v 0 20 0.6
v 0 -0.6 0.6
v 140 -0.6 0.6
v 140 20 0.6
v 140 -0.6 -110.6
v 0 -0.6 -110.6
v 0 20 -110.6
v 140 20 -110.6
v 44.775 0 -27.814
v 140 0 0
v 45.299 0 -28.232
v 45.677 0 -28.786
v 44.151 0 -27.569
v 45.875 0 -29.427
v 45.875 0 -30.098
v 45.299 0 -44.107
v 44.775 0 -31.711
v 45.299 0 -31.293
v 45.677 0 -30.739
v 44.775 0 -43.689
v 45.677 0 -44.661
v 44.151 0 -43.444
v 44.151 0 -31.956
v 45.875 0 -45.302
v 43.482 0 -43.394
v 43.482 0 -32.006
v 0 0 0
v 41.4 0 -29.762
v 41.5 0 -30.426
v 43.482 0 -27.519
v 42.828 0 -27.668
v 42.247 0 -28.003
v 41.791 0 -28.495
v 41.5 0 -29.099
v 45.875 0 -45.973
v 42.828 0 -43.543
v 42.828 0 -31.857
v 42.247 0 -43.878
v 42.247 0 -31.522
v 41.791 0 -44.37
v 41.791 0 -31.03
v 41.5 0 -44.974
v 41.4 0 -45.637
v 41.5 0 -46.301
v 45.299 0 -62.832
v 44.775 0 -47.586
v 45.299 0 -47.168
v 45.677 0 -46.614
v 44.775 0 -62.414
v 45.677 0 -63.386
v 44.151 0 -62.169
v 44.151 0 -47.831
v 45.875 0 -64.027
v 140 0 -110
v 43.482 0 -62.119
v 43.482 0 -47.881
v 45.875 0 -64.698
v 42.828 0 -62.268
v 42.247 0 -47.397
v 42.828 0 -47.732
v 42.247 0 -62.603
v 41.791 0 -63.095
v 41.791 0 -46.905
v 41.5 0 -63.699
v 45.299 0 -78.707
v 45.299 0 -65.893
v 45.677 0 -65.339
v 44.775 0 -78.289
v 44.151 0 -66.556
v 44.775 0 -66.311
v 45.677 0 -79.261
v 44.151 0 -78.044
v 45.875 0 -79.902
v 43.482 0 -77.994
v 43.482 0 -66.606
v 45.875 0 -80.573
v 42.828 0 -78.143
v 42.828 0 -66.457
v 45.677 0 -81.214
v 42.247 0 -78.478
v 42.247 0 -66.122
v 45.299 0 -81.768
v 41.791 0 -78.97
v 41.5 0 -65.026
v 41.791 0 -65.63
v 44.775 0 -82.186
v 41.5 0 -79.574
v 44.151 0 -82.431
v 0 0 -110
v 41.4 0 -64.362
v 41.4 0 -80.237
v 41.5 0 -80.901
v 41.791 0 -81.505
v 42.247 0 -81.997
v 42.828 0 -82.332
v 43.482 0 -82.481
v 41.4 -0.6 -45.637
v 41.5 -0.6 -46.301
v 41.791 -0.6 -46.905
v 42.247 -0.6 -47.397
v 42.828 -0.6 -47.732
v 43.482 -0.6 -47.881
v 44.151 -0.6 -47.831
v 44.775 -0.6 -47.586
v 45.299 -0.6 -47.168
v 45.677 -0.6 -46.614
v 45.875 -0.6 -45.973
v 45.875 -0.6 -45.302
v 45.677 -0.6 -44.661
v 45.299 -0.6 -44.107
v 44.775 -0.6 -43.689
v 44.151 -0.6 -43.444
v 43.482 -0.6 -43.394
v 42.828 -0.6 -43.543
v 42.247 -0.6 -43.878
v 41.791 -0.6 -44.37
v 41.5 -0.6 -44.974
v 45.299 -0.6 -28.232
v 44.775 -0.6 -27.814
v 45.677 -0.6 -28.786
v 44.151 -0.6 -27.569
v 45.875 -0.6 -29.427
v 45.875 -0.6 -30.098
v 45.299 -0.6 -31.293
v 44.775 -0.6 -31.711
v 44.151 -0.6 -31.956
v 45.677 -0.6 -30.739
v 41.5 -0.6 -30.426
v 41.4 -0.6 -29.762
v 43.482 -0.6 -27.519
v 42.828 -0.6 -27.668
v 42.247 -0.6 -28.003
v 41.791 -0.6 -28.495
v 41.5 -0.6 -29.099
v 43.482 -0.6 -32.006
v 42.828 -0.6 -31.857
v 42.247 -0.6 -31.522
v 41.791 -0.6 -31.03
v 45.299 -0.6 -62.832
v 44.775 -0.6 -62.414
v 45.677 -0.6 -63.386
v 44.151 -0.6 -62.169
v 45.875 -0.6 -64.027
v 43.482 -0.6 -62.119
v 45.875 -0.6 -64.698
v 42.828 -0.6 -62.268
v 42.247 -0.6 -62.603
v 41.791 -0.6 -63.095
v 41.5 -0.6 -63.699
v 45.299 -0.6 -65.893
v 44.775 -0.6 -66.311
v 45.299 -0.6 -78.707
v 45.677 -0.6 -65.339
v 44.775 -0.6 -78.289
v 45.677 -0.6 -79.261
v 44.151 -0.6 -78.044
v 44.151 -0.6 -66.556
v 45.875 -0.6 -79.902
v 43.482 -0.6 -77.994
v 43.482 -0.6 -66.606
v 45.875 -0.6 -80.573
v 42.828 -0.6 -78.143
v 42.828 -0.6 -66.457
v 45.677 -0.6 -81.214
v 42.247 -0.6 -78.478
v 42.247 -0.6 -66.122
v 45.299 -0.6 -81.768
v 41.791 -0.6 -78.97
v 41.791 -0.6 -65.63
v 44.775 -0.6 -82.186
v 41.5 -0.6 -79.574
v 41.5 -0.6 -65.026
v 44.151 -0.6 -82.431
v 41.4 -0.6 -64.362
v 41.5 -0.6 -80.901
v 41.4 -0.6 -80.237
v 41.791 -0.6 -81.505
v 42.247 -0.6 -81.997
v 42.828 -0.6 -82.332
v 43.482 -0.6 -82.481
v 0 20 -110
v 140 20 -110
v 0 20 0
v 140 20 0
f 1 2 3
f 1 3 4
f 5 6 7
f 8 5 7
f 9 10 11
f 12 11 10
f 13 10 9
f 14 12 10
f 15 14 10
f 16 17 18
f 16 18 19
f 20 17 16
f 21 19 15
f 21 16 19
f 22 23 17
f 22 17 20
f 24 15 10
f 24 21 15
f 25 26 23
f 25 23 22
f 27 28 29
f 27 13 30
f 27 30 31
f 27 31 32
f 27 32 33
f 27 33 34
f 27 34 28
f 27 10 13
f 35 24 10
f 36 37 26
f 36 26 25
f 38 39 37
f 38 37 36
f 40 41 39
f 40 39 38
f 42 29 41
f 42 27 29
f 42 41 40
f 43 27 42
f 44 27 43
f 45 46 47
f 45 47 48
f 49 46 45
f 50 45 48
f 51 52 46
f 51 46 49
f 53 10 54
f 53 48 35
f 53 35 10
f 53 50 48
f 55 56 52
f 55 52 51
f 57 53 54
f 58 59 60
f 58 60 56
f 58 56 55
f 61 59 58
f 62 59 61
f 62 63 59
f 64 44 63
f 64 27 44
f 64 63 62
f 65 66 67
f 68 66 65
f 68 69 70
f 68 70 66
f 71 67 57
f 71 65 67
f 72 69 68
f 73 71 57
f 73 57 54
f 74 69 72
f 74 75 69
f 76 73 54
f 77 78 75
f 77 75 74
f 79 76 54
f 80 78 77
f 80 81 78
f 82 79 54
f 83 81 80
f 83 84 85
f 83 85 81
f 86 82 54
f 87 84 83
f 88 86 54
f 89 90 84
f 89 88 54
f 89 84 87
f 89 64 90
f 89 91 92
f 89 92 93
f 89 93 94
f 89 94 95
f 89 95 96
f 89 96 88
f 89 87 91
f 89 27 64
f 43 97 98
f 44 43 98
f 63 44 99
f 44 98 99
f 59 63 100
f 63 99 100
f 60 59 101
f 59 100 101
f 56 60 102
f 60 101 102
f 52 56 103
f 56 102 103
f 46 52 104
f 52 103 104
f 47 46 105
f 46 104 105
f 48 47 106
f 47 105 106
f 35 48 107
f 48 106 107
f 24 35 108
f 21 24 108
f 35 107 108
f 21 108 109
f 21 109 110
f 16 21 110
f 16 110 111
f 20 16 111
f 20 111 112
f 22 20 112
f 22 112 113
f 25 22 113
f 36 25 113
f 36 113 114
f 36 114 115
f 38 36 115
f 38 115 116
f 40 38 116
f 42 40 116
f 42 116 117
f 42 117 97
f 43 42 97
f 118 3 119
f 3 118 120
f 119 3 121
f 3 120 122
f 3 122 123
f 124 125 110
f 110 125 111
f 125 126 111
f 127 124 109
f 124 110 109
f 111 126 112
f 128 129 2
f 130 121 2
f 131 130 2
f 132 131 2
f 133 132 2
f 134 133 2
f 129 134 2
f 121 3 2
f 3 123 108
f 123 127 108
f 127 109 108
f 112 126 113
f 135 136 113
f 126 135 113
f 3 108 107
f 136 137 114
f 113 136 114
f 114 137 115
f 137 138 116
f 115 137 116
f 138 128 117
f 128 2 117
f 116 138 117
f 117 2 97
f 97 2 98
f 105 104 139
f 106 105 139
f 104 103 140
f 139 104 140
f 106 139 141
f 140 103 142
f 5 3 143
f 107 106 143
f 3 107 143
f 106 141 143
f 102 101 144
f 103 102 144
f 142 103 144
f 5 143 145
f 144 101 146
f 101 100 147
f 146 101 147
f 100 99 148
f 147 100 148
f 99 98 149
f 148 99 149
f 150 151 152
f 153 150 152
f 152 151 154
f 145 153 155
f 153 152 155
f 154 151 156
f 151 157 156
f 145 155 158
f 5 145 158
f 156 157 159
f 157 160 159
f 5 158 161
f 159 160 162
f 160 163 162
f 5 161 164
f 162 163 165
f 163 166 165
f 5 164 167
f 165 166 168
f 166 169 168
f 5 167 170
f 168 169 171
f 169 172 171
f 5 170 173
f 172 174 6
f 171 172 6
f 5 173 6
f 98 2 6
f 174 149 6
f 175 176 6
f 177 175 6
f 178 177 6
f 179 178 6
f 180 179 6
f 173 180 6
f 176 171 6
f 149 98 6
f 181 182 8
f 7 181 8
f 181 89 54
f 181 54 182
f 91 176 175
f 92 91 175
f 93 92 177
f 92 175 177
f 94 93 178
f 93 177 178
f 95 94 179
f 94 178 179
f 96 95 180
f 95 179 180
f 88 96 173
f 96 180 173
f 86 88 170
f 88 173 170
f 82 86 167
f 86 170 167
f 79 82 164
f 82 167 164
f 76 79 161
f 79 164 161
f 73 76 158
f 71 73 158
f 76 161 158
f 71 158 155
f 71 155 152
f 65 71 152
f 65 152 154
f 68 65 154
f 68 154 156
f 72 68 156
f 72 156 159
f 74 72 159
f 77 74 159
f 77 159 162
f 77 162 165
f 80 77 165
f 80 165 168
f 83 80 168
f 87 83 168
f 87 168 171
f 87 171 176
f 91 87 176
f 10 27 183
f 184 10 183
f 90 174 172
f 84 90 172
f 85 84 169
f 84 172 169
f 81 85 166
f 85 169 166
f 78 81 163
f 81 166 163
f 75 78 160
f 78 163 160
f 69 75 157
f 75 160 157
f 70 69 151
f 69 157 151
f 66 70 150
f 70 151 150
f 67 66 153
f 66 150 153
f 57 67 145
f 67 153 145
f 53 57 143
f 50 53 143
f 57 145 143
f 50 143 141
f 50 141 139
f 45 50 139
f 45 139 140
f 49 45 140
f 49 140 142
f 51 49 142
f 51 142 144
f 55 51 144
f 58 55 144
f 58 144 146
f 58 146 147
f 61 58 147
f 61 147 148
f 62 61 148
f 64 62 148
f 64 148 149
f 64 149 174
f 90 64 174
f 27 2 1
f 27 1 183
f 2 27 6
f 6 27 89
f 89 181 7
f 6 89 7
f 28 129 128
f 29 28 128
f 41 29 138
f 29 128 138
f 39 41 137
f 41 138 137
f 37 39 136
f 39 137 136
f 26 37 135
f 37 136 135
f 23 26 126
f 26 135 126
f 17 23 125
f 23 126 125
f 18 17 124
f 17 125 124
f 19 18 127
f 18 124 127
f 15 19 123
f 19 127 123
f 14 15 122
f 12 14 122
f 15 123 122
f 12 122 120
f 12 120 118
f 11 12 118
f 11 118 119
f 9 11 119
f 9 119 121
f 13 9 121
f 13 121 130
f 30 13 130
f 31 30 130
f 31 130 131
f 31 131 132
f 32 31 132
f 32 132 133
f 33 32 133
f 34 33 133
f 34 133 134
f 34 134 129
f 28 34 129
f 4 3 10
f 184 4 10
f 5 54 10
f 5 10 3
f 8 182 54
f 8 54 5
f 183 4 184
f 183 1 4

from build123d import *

# Parameters (mm, degrees)
CROQUIS1_W                   = 110
CROQUIS1_H                   = 20
SALIENTE_EXTRUIR1_DEPTH      = 140
VACIADO1_T                   = 0.6
TALADRO_DE_MARGEN_PARA_M42_D = 4.5


with BuildPart() as part:
    # Croquis1 → Saliente-Extruir1 (new body)
    with BuildSketch(Plane(origin=(0, 0, 0), x_dir=(0, 0, -1), z_dir=(1, 0, 0))):
        with Locations((55, 10)):
            Rectangle(CROQUIS1_W, CROQUIS1_H)
    extrude(amount=SALIENTE_EXTRUIR1_DEPTH)

    # Vaciado1
    vaciado1_openings = [part.faces().sort_by_distance(p)[0] for p in [
        (70, 20, -55),
        (0, 10, -55),
        (140, 10, -55),
    ]]
    offset(amount=VACIADO1_T, openings=vaciado1_openings, kind=Kind.INTERSECTION)

    # Taladro de margen para M42 (through all)
    with Locations(Plane(origin=(104.234059149, 1, -171.2), x_dir=(1, 0, 0), z_dir=(0, 1, 0))):
        with Locations((-60.584059149, -90.9625), (-60.584059149, -106.8375), (-60.584059149, -125.5625), (-60.584059149, -141.4375)):
            Hole(TALADRO_DE_MARGEN_PARA_M42_D / 2)


solid = part.part
